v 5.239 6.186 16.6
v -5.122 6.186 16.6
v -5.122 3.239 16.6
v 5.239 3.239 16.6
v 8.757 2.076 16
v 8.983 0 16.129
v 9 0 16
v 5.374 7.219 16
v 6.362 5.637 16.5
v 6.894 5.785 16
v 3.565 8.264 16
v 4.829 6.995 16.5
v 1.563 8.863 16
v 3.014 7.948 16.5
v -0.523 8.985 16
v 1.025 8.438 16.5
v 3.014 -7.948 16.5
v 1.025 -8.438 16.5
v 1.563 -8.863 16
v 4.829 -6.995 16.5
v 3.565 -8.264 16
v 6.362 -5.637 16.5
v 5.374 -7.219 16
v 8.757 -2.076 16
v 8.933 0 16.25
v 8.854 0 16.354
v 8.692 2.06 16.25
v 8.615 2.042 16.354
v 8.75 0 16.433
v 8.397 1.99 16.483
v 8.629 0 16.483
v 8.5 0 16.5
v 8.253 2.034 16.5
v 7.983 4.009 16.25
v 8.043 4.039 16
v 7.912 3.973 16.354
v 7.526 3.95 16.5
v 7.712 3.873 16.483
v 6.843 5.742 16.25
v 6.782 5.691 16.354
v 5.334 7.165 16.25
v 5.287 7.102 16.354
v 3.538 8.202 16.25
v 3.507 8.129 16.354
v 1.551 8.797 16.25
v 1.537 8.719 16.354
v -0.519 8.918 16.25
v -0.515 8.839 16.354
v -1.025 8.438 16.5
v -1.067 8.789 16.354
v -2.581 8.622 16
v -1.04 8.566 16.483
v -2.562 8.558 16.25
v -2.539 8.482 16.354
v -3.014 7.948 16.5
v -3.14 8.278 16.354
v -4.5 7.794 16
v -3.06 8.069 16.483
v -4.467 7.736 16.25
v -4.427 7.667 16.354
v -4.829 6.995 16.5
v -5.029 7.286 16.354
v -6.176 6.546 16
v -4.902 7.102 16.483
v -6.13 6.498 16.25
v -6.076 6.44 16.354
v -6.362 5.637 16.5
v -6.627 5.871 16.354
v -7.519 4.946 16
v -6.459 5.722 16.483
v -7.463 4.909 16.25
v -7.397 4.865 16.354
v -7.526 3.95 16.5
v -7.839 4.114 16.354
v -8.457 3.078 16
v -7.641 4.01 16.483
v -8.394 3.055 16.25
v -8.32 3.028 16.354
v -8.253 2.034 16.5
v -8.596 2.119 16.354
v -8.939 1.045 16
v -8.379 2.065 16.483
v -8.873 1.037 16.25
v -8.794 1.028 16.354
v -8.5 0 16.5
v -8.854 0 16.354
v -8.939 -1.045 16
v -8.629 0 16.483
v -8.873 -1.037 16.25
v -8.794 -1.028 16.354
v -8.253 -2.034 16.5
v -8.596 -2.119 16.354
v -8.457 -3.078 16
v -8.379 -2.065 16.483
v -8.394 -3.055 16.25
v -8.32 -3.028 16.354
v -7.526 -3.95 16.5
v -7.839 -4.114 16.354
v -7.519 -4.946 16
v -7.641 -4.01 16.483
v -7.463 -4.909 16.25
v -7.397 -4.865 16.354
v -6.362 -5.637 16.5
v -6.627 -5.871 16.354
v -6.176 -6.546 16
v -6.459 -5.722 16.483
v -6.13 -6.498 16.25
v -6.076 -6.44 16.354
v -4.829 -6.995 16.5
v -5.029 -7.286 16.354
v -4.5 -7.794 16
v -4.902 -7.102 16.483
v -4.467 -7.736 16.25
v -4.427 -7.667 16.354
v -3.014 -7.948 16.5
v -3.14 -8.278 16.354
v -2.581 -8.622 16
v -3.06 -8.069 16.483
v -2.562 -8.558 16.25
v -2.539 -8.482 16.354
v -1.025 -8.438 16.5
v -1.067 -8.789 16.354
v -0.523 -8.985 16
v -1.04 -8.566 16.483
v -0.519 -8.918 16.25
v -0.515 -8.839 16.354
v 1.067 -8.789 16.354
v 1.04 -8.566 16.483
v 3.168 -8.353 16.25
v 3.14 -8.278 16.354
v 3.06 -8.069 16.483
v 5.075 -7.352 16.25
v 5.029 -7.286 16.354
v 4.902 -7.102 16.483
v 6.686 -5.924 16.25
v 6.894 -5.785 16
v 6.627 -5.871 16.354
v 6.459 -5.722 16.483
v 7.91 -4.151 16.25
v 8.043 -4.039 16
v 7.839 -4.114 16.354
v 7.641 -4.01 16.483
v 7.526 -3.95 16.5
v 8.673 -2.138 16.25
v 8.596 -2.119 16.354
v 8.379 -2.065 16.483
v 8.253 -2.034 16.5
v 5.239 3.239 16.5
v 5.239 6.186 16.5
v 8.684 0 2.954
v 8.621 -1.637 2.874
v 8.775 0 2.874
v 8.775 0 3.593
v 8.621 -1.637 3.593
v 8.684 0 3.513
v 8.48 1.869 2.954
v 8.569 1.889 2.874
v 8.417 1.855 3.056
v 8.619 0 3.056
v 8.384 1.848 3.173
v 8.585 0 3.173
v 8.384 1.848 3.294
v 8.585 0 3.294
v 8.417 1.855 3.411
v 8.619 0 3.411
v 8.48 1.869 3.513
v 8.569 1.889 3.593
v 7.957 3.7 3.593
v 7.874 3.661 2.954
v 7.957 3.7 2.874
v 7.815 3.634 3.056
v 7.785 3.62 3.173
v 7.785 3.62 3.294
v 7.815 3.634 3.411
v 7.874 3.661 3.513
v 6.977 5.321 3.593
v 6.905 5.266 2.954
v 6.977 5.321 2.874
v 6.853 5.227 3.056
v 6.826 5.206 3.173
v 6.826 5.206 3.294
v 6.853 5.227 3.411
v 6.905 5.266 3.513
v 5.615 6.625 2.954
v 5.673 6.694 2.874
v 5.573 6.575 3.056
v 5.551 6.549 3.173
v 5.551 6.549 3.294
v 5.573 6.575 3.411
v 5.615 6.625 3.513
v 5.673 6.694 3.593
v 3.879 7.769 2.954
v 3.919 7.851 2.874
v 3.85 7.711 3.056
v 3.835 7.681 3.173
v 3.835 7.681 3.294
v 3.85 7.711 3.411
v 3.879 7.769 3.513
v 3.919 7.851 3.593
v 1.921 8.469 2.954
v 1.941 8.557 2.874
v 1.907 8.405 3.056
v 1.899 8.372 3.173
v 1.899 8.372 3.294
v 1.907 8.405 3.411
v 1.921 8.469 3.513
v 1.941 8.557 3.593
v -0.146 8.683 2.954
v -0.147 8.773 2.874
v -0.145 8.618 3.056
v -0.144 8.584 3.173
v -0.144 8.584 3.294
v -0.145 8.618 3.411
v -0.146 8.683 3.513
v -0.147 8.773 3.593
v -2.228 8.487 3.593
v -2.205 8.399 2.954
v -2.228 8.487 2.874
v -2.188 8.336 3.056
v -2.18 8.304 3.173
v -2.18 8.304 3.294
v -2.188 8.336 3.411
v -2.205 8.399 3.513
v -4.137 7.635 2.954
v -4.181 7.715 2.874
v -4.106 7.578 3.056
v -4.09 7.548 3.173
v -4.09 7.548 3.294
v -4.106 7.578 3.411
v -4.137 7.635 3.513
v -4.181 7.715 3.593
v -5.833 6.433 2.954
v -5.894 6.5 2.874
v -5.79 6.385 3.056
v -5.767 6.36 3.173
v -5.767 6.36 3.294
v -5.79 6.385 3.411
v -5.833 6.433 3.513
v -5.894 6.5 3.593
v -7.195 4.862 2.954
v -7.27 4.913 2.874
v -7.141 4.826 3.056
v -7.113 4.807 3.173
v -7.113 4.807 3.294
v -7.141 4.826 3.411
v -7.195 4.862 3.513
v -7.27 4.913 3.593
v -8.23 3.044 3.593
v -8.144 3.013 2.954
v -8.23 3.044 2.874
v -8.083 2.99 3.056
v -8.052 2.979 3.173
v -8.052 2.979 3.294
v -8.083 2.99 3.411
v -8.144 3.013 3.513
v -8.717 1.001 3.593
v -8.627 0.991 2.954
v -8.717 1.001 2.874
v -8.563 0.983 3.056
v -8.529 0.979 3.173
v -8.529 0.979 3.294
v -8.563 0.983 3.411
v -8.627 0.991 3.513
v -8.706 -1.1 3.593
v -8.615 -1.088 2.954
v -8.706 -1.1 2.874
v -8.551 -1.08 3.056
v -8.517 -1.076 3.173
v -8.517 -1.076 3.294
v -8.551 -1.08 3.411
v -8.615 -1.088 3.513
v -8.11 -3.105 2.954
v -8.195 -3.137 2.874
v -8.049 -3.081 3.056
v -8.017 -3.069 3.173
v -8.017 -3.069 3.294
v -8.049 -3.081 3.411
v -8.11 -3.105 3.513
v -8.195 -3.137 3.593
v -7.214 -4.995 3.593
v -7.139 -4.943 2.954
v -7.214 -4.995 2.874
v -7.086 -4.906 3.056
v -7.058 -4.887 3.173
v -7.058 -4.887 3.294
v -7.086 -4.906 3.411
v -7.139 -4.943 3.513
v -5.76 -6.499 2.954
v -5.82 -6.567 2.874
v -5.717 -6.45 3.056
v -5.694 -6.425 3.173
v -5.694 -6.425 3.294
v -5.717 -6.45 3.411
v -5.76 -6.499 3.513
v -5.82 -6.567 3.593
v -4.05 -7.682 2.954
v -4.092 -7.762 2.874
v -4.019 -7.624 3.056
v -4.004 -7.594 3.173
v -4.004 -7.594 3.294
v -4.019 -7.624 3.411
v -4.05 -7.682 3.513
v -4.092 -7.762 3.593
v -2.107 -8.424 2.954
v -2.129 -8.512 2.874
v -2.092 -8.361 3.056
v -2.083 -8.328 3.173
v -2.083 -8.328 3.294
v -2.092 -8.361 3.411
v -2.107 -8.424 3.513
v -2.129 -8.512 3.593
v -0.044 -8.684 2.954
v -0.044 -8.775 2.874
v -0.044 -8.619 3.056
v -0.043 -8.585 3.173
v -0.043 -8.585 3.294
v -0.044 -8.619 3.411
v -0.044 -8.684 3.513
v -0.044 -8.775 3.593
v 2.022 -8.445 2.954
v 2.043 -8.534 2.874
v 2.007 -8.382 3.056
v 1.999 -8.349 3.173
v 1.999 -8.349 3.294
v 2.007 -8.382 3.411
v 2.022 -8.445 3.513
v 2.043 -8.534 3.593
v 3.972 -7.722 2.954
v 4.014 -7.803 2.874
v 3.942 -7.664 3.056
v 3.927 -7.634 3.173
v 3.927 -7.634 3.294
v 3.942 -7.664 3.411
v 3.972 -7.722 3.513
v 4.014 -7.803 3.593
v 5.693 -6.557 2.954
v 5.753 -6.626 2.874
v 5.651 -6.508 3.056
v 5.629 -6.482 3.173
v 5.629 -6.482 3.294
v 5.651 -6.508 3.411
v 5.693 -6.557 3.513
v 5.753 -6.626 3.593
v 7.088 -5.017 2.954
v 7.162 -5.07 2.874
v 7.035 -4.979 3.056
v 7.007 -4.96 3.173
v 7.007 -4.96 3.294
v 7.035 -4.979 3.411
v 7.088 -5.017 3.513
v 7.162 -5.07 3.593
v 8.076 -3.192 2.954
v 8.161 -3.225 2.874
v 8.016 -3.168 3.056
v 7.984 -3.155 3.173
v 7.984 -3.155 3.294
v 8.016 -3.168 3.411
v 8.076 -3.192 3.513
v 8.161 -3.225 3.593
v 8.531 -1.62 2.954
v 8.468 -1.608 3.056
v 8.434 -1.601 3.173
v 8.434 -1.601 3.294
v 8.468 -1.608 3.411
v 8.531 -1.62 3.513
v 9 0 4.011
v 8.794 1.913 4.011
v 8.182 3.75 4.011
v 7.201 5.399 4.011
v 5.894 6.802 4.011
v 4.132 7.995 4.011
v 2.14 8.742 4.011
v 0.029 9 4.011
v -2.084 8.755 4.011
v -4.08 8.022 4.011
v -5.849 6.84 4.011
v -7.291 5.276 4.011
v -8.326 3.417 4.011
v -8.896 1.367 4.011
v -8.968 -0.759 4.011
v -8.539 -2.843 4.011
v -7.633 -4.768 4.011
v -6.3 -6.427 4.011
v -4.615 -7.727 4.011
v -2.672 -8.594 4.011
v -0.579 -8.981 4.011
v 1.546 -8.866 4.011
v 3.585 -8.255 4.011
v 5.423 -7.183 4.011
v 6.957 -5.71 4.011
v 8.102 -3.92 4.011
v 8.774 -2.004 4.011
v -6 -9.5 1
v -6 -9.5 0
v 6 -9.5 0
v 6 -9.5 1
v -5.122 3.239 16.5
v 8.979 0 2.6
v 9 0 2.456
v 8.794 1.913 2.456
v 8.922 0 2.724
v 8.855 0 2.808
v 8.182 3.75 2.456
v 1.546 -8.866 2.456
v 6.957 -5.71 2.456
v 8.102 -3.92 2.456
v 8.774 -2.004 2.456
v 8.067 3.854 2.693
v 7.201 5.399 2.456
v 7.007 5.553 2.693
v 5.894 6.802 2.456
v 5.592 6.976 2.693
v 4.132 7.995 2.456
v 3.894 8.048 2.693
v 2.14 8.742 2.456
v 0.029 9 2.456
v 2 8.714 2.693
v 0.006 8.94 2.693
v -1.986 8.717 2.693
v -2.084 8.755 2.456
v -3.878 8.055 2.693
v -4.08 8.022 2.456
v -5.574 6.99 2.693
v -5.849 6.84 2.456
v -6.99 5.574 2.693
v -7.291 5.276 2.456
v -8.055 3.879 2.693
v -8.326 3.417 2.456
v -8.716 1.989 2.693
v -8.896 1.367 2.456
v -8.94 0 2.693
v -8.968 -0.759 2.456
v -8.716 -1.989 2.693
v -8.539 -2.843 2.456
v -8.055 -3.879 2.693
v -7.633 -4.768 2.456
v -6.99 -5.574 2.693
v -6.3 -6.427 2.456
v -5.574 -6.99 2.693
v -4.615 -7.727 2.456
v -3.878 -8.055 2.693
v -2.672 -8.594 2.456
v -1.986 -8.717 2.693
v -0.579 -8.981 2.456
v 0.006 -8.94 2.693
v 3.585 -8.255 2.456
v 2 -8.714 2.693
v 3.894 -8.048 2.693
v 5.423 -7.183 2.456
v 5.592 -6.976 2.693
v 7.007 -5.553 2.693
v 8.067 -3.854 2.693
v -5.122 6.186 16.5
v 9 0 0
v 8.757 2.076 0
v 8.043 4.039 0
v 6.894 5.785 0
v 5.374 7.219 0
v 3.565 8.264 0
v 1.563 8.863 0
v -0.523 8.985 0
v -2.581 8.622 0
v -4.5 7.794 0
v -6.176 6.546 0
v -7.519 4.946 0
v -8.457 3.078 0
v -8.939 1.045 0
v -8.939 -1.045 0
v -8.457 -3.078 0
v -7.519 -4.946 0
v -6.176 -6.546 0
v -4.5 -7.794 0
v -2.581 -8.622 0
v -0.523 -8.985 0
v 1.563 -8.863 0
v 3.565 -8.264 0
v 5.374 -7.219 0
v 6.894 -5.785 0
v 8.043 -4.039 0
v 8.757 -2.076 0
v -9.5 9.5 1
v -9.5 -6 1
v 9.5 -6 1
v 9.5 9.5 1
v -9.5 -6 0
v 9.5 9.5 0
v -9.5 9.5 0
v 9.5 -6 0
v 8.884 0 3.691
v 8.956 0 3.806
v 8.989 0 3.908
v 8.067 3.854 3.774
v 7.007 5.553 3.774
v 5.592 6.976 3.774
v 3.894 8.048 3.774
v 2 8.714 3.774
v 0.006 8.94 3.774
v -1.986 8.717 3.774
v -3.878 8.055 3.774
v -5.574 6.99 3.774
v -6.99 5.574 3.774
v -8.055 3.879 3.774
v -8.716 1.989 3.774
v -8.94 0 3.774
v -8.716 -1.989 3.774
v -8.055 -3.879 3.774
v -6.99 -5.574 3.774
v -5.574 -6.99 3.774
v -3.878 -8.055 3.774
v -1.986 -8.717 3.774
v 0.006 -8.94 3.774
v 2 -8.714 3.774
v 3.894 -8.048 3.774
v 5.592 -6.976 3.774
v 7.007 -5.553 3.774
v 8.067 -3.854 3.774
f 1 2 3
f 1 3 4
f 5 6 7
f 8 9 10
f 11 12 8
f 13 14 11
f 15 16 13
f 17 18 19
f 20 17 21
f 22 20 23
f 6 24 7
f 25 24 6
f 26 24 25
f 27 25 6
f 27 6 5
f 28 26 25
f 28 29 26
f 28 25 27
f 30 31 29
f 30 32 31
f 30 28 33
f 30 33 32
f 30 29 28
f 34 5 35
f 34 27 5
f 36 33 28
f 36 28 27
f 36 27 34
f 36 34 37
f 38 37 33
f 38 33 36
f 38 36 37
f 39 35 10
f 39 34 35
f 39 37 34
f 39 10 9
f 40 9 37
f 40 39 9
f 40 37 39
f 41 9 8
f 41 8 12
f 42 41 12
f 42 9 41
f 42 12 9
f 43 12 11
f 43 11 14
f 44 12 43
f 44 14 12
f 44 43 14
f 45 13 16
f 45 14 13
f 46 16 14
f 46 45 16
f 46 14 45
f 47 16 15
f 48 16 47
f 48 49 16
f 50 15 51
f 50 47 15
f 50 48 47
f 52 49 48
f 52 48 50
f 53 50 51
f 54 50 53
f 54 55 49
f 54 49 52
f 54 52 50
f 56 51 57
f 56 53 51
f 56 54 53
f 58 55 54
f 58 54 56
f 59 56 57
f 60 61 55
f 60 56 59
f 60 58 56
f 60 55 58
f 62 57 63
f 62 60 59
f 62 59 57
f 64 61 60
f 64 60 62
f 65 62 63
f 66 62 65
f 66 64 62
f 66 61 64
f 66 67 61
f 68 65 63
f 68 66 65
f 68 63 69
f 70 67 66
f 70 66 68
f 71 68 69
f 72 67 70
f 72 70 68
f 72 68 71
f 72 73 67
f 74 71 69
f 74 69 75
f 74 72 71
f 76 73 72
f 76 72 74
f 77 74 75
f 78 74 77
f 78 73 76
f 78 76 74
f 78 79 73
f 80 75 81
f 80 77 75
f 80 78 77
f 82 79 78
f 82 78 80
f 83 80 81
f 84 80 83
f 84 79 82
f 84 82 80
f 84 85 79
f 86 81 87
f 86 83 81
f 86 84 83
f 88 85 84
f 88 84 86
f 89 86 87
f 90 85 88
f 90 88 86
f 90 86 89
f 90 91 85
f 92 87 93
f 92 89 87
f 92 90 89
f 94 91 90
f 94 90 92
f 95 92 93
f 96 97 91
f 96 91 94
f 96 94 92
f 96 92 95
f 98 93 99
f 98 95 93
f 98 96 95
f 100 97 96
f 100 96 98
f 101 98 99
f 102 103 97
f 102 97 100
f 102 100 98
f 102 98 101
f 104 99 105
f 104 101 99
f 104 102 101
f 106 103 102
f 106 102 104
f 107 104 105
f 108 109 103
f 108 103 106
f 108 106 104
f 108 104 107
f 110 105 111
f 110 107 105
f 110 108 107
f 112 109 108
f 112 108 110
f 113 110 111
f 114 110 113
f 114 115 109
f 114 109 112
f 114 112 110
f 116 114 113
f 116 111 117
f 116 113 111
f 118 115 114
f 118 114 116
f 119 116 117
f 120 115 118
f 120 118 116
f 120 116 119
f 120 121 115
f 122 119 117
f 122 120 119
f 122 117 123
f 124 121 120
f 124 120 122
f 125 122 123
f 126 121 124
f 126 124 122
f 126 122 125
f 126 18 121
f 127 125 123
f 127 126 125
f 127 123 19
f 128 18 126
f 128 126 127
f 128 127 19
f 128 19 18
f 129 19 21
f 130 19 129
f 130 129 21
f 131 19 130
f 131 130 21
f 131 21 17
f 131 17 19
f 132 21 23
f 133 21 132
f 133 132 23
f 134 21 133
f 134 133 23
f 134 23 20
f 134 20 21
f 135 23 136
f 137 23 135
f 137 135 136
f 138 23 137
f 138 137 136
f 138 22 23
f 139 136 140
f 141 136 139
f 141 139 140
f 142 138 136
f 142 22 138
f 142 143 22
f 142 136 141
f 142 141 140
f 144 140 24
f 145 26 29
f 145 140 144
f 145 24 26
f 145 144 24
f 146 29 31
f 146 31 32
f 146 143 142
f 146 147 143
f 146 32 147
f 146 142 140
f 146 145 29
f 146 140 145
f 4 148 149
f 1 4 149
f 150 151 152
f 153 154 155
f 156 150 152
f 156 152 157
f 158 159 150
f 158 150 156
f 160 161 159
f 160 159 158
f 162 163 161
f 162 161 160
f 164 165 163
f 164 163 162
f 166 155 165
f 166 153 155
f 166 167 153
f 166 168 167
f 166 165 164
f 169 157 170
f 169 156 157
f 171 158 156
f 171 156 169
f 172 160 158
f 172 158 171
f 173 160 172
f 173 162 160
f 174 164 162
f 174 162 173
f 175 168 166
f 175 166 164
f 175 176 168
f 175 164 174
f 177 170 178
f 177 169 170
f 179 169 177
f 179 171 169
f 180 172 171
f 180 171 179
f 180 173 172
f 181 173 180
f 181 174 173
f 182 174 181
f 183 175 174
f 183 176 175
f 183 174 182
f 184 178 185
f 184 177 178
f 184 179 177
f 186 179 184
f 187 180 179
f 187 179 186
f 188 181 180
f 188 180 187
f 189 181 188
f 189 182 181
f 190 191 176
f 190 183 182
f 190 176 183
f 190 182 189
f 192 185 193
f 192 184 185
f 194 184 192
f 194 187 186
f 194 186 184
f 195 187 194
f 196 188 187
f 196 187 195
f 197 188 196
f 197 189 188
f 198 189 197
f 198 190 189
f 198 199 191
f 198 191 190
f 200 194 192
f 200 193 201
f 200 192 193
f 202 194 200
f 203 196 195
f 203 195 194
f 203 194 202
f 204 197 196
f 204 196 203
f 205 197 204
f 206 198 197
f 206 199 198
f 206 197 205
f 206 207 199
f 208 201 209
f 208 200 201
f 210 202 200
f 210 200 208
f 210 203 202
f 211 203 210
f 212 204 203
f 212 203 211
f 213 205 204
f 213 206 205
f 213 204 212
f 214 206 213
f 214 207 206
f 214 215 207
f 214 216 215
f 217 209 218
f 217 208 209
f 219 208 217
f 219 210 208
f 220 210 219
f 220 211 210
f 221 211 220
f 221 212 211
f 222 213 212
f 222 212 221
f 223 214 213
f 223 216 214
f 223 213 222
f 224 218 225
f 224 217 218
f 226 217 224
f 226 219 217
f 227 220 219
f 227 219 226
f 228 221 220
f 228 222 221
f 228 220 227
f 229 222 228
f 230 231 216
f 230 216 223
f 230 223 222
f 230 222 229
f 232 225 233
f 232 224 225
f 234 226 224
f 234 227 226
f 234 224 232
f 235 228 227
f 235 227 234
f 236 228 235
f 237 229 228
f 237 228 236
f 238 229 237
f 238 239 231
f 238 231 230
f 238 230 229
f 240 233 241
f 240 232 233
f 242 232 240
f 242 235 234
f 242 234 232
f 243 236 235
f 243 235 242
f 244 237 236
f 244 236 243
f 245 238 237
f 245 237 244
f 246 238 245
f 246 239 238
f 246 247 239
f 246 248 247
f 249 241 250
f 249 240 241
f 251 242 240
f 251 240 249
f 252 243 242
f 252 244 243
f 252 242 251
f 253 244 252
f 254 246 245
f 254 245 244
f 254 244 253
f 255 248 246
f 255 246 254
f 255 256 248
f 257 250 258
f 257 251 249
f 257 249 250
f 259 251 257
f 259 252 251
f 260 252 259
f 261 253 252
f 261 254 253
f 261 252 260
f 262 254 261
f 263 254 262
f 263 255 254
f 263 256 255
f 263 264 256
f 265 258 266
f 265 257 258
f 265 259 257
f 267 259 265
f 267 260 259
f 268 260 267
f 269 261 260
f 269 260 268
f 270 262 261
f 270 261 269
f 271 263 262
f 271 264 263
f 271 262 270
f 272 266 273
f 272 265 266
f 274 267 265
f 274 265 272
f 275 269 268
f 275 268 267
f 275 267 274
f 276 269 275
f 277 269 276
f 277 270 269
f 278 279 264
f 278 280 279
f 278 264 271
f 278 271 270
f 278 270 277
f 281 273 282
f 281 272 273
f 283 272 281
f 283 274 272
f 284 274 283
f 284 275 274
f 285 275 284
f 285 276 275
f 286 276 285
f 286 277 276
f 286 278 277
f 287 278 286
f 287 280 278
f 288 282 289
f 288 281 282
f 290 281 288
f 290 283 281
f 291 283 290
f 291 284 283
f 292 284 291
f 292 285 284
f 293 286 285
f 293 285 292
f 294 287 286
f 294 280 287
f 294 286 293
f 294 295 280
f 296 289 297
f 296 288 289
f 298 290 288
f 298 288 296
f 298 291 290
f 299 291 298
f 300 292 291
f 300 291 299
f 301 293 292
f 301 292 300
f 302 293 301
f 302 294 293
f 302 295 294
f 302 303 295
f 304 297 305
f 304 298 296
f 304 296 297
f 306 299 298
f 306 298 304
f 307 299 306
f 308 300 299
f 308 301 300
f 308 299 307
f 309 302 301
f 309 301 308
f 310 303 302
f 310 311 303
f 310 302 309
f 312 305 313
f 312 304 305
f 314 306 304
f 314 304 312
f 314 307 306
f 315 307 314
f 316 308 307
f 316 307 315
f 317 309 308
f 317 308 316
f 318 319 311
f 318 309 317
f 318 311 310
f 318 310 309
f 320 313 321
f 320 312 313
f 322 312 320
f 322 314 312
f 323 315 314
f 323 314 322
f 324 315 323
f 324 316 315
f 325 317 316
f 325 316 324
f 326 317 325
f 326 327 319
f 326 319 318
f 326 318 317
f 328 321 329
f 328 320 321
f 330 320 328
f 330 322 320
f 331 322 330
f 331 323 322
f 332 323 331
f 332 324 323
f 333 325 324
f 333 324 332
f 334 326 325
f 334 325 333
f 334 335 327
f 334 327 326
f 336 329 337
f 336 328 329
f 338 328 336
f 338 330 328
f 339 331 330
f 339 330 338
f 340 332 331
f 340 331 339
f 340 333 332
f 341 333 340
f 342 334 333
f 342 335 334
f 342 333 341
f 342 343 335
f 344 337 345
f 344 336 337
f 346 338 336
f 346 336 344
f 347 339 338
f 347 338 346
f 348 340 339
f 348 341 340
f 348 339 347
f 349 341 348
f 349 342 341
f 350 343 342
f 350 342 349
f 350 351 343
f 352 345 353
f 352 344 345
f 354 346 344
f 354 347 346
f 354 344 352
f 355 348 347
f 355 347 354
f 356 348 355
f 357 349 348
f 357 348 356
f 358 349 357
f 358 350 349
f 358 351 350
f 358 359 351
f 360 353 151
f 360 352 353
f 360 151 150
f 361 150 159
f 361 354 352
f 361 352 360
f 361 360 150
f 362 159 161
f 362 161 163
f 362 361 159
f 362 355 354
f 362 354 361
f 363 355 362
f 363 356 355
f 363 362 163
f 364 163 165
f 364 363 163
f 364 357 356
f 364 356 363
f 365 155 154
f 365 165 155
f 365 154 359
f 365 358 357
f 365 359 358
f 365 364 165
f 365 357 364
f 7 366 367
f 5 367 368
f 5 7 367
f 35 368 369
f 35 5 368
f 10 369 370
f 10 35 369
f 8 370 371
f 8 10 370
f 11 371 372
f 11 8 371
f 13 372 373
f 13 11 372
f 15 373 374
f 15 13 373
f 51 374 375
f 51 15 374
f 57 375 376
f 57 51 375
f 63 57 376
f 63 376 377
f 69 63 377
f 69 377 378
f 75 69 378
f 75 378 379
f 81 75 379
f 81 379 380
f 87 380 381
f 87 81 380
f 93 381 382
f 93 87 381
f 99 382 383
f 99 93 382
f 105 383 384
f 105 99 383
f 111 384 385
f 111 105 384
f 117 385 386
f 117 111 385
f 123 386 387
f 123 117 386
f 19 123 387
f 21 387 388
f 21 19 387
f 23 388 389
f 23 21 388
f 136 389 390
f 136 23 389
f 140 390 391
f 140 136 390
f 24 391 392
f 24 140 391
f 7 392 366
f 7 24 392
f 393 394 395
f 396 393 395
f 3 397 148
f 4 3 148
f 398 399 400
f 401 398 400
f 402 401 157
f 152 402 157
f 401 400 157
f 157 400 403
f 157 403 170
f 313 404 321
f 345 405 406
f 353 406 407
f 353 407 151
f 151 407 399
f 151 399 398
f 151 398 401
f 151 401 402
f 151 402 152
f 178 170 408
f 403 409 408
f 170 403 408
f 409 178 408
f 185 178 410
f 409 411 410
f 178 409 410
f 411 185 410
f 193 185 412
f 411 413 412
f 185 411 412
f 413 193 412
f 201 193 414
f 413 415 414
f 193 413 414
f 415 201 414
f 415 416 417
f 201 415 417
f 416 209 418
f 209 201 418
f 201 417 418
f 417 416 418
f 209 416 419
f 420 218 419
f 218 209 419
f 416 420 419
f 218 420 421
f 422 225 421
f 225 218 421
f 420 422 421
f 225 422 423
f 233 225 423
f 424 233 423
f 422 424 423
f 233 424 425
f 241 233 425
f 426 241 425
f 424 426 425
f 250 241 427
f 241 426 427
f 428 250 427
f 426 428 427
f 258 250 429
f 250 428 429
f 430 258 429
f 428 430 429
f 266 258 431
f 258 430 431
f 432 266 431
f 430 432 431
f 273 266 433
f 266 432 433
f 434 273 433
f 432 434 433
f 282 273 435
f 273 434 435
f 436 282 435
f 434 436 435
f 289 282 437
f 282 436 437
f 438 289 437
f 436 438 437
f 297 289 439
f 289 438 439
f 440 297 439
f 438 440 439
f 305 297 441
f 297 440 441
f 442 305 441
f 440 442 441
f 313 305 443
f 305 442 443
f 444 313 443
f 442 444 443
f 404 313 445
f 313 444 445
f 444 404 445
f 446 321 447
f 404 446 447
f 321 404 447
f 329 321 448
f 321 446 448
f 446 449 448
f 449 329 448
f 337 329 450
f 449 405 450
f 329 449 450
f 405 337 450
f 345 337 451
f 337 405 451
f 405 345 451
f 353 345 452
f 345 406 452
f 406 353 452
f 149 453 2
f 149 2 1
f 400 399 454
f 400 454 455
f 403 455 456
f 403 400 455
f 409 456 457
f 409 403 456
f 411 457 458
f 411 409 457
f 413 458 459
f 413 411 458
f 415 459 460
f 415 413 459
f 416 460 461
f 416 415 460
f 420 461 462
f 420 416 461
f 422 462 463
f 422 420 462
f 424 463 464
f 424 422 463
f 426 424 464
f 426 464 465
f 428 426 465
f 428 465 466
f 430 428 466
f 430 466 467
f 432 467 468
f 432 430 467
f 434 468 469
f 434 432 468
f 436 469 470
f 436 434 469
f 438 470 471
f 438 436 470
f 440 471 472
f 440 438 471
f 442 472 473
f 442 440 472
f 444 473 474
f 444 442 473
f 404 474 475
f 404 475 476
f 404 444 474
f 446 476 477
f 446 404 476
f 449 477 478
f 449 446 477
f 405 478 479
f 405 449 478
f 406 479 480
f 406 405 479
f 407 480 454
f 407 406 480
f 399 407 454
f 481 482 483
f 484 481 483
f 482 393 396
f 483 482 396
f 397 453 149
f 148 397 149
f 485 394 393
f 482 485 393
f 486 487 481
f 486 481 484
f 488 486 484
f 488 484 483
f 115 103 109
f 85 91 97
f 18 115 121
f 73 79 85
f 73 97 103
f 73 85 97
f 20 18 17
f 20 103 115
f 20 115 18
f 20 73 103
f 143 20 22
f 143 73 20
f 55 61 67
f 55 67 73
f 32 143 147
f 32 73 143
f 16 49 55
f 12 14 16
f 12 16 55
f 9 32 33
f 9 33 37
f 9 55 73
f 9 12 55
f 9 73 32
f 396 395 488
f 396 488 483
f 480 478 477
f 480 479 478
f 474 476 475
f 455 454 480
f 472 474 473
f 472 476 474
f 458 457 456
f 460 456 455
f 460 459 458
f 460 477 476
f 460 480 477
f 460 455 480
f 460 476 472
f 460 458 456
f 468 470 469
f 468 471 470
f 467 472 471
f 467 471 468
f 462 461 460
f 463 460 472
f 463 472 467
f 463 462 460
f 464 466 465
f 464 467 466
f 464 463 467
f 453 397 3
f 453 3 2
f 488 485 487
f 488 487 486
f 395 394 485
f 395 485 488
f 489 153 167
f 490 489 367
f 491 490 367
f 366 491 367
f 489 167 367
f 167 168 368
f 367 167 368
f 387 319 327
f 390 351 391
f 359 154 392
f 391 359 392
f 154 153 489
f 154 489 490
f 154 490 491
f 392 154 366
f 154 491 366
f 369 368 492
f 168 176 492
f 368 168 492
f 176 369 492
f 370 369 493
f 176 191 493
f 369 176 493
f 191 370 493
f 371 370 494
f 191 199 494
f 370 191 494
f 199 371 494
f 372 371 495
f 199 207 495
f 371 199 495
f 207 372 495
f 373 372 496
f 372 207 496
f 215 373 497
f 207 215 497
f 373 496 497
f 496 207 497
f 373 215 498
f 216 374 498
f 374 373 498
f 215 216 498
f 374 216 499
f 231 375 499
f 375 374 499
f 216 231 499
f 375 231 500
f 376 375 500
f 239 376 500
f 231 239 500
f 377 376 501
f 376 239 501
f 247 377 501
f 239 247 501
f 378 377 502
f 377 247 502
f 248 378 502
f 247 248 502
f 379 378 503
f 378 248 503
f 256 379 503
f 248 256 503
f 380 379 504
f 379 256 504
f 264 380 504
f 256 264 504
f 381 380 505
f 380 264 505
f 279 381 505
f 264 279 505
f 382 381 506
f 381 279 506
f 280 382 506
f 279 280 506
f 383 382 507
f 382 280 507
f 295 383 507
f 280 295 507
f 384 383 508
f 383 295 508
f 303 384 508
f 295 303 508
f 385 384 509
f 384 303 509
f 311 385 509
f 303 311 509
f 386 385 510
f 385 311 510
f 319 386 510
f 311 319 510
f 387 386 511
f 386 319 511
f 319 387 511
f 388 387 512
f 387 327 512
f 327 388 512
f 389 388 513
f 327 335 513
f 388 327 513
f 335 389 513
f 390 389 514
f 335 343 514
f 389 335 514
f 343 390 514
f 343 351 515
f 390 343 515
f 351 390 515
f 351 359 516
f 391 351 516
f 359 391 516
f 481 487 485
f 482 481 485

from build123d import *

# Parameters (mm, degrees)
F2_R     = 0.5
F3_W     = 19
F3_H     = 19
F4_DEPTH = 1
F5_SIZE  = 3.5
F6_W     = 10.360902
F6_H     = 2.946893
F7_DEPTH = 0.1


with BuildPart() as f1:
    # F0 (on Front) → F1 (revolve)
    with BuildSketch(Plane.XZ):
        with BuildLine():
            Line((0, 16.5), (0, 0))
            Line((0, 0), (9, 0))
            Line((9, 0), (9, 2.802913))
            ThreePointArc((9, 2.802913), (8.580664, 3.233504), (9, 3.664096))
            Line((9, 3.664096), (9, 16.5))
            Line((9, 16.5), (0, 16.5))
        make_face()
    revolve(axis=Axis((0, 0, 8.25), (0, 0, 1)))

    # F2
    f2_edges = [f1.edges().sort_by_distance(p)[0] for p in [
        (-9, 0, 16.5),
        (-9, 0, 3.664096),
        (-9, 0, 2.802913),
    ]]
    fillet(f2_edges, radius=F2_R)


with BuildPart() as f4:
    # F3 (on face) → F4 (new body)
    with BuildSketch(Plane(origin=(0, 0, 0), x_dir=(1, 0, 0), z_dir=(0, 0, -1))):
        Rectangle(F3_W, F3_H)
    extrude(amount=-F4_DEPTH)

    # F5
    f5_edges = [f4.edges().sort_by_distance(p)[0] for p in [
        (-9.5, -9.5, 0.5),
        (9.5, -9.5, 0.5),
    ]]
    chamfer(f5_edges, length=F5_SIZE)


with BuildPart() as f7:
    # F6 (on face) → F7 (new body)
    with BuildSketch(Plane.XY.offset(16.5)):
        with Locations((0.05847, 4.71269)):
            Rectangle(F6_W, F6_H)
    extrude(amount=F7_DEPTH)


solid = Compound([f1.part, f4.part, f7.part])
